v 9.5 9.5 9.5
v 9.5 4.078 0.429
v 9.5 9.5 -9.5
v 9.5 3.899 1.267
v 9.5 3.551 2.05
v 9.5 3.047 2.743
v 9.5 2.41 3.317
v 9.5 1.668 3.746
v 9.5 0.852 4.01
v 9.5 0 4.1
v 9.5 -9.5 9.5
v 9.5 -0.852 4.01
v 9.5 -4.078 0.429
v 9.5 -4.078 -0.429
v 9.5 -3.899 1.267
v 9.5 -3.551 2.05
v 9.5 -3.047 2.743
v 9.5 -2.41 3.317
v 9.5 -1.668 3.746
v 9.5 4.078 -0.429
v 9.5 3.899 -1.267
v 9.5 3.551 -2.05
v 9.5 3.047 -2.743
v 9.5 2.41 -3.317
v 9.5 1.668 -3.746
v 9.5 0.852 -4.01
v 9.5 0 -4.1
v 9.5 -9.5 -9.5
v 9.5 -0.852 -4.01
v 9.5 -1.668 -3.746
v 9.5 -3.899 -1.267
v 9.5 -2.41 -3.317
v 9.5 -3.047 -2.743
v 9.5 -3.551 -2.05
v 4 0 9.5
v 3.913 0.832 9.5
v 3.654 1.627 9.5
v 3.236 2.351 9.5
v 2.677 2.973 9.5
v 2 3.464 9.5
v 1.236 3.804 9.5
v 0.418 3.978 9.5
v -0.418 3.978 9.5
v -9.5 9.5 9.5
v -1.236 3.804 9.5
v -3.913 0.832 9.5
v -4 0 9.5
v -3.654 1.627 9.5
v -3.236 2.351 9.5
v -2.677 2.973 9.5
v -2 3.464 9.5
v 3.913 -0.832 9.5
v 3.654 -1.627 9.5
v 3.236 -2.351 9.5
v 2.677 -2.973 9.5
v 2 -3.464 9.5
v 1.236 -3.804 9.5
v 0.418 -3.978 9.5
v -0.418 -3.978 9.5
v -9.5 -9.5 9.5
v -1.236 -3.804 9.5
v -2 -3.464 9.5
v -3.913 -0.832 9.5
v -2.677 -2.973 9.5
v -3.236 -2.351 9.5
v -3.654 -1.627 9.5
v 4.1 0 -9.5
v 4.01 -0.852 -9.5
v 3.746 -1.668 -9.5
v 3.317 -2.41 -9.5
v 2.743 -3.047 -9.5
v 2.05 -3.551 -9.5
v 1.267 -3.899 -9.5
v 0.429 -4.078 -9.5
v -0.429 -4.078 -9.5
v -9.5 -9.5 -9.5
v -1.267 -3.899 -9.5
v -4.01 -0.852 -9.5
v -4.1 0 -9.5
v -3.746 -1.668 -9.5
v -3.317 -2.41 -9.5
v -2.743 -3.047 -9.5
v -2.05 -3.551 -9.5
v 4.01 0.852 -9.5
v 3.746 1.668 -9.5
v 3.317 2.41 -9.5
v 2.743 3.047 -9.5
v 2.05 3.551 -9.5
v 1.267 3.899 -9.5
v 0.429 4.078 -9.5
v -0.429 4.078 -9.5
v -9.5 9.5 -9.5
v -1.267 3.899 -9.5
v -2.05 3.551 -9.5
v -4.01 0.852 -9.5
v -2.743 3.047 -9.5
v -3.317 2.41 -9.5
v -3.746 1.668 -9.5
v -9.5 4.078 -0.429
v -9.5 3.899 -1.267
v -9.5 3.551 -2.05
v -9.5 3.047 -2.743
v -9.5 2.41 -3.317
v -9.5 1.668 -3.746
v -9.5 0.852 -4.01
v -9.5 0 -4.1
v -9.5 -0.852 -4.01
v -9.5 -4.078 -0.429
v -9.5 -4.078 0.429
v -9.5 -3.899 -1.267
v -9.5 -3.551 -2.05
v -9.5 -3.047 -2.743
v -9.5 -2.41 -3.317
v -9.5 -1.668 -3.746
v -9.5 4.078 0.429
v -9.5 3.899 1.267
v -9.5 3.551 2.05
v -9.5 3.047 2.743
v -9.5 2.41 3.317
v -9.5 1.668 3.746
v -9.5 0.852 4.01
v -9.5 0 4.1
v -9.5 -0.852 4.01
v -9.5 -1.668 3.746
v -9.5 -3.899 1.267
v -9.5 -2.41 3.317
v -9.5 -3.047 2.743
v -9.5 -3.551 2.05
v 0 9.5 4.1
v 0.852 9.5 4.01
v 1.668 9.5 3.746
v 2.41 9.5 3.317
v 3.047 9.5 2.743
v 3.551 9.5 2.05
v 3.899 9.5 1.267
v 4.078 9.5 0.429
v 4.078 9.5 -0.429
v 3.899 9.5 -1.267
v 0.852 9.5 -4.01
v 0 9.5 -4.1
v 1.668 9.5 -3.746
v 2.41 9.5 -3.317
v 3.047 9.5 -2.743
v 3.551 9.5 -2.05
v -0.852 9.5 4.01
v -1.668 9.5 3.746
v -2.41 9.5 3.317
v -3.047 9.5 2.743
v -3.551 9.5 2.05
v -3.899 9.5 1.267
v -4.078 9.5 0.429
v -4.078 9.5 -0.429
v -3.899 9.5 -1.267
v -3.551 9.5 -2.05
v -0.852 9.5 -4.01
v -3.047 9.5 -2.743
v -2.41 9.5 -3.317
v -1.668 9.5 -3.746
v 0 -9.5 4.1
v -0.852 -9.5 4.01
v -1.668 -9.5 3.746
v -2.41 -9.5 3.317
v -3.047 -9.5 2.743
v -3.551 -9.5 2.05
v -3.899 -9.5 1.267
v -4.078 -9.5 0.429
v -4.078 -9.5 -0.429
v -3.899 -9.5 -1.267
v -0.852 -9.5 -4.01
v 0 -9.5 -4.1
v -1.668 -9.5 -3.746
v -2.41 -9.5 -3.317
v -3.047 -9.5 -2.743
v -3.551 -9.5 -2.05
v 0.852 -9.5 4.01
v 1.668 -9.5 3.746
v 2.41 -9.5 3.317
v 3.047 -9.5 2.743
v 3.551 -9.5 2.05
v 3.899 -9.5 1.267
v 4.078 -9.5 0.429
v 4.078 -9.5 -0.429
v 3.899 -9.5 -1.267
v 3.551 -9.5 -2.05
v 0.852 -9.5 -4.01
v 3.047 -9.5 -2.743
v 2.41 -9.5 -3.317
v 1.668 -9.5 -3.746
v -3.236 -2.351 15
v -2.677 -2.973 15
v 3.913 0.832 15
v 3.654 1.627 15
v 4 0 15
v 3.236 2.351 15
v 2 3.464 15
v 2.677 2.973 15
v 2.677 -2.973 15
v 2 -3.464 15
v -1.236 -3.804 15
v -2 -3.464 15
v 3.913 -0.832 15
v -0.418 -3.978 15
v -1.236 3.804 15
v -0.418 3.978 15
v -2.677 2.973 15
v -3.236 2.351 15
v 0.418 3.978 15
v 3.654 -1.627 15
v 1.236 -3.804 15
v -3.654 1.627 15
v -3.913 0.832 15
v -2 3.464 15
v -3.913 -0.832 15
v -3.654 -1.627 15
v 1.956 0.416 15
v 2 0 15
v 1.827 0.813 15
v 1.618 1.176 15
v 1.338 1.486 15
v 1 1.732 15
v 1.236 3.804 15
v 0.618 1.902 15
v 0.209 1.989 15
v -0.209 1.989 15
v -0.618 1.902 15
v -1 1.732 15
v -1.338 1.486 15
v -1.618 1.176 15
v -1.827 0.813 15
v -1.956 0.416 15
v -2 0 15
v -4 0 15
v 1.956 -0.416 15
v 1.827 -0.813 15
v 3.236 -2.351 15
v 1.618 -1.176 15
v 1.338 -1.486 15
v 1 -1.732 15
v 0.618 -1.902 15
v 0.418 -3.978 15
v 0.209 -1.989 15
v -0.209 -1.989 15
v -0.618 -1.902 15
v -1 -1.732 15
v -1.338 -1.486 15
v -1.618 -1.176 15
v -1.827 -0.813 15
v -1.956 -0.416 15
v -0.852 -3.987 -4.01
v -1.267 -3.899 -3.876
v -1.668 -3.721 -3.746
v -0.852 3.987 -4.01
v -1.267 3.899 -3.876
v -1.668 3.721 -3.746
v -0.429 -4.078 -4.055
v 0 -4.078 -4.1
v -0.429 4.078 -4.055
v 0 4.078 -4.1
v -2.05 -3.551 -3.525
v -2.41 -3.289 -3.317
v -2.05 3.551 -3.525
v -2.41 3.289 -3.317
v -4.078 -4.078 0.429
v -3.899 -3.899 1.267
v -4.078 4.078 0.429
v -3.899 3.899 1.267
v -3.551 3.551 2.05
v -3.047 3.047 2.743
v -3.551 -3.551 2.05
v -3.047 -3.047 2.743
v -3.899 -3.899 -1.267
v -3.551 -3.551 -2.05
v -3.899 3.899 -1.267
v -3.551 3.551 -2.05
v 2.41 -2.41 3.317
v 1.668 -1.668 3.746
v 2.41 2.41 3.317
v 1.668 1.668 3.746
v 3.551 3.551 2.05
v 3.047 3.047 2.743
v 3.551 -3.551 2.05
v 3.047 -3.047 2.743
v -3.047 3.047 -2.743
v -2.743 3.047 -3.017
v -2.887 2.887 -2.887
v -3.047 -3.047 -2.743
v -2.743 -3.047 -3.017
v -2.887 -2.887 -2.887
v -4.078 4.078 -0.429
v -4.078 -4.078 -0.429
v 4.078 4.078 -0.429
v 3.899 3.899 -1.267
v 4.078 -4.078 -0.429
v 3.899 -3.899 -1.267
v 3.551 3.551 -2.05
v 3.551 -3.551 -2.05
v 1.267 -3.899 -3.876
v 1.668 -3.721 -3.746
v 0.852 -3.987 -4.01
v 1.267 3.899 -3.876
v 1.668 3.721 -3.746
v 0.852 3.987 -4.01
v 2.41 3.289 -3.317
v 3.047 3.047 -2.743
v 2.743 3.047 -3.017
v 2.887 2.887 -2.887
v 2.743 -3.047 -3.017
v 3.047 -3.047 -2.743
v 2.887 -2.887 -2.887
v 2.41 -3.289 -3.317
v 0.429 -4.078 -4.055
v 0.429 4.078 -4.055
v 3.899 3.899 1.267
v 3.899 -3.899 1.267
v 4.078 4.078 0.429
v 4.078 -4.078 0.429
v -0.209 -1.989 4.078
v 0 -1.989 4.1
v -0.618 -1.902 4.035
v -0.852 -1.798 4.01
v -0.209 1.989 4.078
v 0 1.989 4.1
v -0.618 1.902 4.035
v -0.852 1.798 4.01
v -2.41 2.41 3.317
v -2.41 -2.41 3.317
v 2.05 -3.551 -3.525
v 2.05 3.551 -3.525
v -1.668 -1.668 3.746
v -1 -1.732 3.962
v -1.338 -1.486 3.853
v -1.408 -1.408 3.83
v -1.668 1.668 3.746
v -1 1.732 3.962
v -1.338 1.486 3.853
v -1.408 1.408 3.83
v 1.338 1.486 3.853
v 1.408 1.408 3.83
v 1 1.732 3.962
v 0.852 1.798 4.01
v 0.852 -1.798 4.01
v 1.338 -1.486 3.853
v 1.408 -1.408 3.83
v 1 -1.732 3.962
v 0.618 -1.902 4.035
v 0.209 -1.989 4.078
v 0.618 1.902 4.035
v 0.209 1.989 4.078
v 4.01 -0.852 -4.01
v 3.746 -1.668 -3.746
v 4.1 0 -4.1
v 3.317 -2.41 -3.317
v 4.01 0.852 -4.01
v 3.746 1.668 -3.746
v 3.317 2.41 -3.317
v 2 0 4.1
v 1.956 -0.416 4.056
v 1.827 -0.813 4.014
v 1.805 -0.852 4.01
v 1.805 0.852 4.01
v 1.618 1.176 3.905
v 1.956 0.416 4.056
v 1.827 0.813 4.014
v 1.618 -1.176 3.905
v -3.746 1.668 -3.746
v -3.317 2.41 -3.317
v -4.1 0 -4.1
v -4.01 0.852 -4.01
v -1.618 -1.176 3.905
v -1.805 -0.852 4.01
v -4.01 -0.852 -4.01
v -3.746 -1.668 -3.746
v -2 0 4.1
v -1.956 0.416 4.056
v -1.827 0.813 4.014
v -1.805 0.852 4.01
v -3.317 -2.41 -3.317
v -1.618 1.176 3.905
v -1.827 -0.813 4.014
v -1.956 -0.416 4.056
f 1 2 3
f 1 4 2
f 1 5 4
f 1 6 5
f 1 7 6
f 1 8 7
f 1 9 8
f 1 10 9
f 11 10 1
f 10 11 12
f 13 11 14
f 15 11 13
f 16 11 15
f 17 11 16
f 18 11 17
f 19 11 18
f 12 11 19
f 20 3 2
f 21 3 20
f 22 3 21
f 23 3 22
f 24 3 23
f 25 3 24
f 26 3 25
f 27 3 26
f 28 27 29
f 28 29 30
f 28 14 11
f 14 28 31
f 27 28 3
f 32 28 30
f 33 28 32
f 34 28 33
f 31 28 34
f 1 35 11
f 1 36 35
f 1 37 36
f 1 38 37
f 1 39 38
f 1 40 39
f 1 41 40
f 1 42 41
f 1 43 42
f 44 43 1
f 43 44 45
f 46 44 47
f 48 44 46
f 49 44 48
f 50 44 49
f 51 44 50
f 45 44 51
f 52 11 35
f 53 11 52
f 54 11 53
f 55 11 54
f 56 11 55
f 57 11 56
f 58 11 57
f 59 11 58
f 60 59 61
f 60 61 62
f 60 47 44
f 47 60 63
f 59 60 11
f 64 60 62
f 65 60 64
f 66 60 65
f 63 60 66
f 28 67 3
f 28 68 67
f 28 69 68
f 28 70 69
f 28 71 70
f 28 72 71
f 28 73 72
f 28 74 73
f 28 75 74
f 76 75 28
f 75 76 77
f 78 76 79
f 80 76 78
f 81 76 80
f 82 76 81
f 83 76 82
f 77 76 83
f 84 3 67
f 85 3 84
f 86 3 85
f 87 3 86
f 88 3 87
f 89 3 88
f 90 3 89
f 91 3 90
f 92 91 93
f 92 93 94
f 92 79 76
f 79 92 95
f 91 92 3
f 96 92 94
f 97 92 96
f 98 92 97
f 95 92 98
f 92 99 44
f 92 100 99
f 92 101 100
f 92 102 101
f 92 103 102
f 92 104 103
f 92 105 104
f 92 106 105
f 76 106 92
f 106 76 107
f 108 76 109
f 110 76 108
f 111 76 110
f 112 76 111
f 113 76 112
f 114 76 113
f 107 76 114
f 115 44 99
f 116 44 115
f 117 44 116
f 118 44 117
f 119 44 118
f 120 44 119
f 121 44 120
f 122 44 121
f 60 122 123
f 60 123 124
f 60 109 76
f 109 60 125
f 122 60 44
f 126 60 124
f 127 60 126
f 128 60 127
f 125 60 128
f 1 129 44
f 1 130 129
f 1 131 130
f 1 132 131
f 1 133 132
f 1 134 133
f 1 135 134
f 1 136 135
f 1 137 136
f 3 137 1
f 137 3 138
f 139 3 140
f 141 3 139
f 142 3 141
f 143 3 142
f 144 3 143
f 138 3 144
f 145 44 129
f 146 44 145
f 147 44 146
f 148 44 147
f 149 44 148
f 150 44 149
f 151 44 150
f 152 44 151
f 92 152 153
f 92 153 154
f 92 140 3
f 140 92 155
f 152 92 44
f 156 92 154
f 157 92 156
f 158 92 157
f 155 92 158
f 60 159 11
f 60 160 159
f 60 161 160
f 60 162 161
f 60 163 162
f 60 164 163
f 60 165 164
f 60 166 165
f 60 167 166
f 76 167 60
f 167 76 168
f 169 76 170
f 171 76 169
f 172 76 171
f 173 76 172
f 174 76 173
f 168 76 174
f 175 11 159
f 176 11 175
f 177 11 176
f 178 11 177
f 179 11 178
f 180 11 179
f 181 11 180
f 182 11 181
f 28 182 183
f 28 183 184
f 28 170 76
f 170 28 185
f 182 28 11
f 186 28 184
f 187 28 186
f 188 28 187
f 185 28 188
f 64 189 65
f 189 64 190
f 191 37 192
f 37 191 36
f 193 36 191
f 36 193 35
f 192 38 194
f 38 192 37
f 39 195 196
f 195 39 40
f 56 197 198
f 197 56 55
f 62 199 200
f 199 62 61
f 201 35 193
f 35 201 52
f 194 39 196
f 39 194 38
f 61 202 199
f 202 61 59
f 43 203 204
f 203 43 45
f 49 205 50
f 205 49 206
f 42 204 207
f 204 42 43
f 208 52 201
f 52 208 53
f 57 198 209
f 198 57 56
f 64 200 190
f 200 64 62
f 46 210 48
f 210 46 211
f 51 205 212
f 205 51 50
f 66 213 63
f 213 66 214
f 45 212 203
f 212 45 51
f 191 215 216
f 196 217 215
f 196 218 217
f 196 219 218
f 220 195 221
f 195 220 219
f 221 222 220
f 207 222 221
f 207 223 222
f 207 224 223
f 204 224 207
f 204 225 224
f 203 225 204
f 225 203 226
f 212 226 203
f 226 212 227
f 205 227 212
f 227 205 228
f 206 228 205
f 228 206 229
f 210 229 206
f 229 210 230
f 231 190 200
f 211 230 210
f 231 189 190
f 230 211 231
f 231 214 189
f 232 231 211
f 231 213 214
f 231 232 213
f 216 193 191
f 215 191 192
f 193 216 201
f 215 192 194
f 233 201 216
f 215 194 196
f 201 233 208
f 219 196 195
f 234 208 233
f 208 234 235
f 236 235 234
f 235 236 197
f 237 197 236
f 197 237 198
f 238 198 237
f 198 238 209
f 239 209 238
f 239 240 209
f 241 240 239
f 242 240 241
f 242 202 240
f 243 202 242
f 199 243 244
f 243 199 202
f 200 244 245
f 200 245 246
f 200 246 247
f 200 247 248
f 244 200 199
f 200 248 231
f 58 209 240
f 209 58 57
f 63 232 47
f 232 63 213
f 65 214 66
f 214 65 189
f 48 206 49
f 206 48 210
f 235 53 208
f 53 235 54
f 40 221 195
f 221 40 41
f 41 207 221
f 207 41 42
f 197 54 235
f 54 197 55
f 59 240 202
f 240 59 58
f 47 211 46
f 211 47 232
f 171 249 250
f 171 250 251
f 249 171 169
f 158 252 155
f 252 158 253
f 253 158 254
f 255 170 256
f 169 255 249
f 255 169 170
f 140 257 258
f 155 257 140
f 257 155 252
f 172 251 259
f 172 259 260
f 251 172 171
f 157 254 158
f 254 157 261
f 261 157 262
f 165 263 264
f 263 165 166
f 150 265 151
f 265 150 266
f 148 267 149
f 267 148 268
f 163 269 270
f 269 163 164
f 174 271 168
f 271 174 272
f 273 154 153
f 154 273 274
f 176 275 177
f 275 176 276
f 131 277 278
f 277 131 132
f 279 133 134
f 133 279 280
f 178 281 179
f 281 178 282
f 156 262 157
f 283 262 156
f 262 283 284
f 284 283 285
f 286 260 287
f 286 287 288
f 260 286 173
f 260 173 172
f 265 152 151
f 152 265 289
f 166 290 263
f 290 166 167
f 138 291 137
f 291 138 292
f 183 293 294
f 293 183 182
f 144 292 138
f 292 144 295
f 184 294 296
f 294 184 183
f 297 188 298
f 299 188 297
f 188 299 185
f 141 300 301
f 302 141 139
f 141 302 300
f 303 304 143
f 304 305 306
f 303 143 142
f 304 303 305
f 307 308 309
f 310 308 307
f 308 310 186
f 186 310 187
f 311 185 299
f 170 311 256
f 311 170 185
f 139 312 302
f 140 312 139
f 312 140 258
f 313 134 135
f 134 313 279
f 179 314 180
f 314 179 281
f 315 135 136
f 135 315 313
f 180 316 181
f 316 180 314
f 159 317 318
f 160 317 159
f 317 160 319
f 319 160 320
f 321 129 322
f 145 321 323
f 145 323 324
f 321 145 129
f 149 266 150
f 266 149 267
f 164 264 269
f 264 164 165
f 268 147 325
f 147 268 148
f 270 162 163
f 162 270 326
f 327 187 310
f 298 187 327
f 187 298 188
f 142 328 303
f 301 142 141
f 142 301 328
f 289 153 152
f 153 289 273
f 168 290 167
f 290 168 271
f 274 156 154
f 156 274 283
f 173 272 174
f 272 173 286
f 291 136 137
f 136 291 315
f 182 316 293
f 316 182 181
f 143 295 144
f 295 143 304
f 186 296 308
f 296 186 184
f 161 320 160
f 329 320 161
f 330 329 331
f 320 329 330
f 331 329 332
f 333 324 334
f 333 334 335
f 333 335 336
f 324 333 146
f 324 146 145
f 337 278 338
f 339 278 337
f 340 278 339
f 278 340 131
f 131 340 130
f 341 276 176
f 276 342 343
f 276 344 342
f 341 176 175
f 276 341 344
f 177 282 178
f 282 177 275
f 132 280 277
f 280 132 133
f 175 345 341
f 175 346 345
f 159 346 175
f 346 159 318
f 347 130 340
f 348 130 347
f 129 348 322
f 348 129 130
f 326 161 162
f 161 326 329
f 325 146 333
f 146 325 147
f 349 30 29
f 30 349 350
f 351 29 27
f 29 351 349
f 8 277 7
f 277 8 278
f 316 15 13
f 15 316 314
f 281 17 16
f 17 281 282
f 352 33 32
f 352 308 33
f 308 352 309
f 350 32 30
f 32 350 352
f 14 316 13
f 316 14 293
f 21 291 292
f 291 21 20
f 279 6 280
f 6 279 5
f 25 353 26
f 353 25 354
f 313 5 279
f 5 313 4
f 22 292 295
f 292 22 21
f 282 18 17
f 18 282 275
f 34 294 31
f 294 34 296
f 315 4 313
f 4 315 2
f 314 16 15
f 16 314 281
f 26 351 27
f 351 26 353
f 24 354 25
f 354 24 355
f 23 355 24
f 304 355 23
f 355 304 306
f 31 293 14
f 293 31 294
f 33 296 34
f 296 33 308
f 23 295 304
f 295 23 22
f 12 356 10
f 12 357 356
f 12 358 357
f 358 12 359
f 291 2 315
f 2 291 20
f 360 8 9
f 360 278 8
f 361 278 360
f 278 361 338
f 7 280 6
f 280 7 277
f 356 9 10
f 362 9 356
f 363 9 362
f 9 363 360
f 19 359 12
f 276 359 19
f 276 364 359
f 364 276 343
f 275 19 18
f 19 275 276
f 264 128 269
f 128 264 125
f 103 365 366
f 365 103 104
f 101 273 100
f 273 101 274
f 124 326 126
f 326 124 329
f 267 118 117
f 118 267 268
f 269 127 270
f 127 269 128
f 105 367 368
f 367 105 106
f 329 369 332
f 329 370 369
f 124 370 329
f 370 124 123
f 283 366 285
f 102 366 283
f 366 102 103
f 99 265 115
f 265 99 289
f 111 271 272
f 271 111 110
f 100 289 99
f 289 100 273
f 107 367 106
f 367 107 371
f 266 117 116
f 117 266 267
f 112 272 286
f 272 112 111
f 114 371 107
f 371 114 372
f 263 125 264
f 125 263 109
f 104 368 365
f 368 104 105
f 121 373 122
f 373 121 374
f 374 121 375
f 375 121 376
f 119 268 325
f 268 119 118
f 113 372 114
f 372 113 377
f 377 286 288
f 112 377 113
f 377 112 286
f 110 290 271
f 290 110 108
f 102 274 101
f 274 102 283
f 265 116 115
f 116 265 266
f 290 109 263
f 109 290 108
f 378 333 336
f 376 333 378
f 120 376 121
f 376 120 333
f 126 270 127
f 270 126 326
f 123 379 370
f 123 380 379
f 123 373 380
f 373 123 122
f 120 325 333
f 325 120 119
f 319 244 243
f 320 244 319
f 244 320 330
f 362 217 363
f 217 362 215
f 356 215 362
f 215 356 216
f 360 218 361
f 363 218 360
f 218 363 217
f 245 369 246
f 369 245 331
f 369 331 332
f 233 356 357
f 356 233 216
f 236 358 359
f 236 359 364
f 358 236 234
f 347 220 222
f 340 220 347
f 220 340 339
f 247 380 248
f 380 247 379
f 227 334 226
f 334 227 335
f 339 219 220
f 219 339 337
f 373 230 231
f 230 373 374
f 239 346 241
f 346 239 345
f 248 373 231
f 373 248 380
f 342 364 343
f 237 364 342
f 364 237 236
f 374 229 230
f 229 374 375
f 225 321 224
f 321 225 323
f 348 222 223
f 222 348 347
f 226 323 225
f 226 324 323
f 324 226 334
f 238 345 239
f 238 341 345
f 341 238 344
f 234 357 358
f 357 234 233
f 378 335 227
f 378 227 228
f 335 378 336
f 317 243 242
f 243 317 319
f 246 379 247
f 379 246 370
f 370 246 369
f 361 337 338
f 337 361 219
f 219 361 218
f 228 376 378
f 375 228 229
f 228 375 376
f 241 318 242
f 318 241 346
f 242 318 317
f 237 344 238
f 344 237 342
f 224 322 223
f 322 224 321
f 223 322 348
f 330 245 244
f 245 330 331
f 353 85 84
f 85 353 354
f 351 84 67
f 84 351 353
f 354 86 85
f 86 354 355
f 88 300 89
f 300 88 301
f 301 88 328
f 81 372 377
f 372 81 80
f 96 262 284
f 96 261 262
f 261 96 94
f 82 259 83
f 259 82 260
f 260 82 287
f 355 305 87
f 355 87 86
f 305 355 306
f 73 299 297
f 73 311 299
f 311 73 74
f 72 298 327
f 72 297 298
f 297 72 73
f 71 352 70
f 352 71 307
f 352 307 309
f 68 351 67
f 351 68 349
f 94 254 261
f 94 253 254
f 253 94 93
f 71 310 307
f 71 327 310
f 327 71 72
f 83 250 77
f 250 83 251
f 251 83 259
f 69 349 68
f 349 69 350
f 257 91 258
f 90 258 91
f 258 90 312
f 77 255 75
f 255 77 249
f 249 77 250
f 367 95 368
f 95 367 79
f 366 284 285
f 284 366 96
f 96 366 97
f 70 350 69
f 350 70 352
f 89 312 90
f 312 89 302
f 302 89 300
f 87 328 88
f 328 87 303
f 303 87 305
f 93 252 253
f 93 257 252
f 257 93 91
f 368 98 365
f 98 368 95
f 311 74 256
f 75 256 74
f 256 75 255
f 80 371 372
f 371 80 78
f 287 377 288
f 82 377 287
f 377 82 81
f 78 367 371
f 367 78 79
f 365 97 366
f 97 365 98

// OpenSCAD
$fs=.1;


radius = 8/2;
hole_radius = 8.2/2;//radius + 0.2;
height = 15;
side = 19;


difference(){
  union(){
    cube([side, side, side], center=true);
    difference(){
      cylinder(r1=radius, r2=radius, h=height, center=false);
    }
  }
  union(){
            translate([0,0,-height+0.1])cylinder(r1=radius/2, r2=radius/2, h=height*2, center=false);
    translate([0, 0, -height]){
      cylinder(r1=hole_radius, r2=hole_radius, h=height, center=false);

    }
    for (i = [1 : abs(1) : 4]) {
      rotate([0, 90, (90 * i)]){
        translate([0, 0, -height]){
          cylinder(r1=hole_radius, r2=hole_radius, h=height, center=false);
        }
      }
    }
  }
}
